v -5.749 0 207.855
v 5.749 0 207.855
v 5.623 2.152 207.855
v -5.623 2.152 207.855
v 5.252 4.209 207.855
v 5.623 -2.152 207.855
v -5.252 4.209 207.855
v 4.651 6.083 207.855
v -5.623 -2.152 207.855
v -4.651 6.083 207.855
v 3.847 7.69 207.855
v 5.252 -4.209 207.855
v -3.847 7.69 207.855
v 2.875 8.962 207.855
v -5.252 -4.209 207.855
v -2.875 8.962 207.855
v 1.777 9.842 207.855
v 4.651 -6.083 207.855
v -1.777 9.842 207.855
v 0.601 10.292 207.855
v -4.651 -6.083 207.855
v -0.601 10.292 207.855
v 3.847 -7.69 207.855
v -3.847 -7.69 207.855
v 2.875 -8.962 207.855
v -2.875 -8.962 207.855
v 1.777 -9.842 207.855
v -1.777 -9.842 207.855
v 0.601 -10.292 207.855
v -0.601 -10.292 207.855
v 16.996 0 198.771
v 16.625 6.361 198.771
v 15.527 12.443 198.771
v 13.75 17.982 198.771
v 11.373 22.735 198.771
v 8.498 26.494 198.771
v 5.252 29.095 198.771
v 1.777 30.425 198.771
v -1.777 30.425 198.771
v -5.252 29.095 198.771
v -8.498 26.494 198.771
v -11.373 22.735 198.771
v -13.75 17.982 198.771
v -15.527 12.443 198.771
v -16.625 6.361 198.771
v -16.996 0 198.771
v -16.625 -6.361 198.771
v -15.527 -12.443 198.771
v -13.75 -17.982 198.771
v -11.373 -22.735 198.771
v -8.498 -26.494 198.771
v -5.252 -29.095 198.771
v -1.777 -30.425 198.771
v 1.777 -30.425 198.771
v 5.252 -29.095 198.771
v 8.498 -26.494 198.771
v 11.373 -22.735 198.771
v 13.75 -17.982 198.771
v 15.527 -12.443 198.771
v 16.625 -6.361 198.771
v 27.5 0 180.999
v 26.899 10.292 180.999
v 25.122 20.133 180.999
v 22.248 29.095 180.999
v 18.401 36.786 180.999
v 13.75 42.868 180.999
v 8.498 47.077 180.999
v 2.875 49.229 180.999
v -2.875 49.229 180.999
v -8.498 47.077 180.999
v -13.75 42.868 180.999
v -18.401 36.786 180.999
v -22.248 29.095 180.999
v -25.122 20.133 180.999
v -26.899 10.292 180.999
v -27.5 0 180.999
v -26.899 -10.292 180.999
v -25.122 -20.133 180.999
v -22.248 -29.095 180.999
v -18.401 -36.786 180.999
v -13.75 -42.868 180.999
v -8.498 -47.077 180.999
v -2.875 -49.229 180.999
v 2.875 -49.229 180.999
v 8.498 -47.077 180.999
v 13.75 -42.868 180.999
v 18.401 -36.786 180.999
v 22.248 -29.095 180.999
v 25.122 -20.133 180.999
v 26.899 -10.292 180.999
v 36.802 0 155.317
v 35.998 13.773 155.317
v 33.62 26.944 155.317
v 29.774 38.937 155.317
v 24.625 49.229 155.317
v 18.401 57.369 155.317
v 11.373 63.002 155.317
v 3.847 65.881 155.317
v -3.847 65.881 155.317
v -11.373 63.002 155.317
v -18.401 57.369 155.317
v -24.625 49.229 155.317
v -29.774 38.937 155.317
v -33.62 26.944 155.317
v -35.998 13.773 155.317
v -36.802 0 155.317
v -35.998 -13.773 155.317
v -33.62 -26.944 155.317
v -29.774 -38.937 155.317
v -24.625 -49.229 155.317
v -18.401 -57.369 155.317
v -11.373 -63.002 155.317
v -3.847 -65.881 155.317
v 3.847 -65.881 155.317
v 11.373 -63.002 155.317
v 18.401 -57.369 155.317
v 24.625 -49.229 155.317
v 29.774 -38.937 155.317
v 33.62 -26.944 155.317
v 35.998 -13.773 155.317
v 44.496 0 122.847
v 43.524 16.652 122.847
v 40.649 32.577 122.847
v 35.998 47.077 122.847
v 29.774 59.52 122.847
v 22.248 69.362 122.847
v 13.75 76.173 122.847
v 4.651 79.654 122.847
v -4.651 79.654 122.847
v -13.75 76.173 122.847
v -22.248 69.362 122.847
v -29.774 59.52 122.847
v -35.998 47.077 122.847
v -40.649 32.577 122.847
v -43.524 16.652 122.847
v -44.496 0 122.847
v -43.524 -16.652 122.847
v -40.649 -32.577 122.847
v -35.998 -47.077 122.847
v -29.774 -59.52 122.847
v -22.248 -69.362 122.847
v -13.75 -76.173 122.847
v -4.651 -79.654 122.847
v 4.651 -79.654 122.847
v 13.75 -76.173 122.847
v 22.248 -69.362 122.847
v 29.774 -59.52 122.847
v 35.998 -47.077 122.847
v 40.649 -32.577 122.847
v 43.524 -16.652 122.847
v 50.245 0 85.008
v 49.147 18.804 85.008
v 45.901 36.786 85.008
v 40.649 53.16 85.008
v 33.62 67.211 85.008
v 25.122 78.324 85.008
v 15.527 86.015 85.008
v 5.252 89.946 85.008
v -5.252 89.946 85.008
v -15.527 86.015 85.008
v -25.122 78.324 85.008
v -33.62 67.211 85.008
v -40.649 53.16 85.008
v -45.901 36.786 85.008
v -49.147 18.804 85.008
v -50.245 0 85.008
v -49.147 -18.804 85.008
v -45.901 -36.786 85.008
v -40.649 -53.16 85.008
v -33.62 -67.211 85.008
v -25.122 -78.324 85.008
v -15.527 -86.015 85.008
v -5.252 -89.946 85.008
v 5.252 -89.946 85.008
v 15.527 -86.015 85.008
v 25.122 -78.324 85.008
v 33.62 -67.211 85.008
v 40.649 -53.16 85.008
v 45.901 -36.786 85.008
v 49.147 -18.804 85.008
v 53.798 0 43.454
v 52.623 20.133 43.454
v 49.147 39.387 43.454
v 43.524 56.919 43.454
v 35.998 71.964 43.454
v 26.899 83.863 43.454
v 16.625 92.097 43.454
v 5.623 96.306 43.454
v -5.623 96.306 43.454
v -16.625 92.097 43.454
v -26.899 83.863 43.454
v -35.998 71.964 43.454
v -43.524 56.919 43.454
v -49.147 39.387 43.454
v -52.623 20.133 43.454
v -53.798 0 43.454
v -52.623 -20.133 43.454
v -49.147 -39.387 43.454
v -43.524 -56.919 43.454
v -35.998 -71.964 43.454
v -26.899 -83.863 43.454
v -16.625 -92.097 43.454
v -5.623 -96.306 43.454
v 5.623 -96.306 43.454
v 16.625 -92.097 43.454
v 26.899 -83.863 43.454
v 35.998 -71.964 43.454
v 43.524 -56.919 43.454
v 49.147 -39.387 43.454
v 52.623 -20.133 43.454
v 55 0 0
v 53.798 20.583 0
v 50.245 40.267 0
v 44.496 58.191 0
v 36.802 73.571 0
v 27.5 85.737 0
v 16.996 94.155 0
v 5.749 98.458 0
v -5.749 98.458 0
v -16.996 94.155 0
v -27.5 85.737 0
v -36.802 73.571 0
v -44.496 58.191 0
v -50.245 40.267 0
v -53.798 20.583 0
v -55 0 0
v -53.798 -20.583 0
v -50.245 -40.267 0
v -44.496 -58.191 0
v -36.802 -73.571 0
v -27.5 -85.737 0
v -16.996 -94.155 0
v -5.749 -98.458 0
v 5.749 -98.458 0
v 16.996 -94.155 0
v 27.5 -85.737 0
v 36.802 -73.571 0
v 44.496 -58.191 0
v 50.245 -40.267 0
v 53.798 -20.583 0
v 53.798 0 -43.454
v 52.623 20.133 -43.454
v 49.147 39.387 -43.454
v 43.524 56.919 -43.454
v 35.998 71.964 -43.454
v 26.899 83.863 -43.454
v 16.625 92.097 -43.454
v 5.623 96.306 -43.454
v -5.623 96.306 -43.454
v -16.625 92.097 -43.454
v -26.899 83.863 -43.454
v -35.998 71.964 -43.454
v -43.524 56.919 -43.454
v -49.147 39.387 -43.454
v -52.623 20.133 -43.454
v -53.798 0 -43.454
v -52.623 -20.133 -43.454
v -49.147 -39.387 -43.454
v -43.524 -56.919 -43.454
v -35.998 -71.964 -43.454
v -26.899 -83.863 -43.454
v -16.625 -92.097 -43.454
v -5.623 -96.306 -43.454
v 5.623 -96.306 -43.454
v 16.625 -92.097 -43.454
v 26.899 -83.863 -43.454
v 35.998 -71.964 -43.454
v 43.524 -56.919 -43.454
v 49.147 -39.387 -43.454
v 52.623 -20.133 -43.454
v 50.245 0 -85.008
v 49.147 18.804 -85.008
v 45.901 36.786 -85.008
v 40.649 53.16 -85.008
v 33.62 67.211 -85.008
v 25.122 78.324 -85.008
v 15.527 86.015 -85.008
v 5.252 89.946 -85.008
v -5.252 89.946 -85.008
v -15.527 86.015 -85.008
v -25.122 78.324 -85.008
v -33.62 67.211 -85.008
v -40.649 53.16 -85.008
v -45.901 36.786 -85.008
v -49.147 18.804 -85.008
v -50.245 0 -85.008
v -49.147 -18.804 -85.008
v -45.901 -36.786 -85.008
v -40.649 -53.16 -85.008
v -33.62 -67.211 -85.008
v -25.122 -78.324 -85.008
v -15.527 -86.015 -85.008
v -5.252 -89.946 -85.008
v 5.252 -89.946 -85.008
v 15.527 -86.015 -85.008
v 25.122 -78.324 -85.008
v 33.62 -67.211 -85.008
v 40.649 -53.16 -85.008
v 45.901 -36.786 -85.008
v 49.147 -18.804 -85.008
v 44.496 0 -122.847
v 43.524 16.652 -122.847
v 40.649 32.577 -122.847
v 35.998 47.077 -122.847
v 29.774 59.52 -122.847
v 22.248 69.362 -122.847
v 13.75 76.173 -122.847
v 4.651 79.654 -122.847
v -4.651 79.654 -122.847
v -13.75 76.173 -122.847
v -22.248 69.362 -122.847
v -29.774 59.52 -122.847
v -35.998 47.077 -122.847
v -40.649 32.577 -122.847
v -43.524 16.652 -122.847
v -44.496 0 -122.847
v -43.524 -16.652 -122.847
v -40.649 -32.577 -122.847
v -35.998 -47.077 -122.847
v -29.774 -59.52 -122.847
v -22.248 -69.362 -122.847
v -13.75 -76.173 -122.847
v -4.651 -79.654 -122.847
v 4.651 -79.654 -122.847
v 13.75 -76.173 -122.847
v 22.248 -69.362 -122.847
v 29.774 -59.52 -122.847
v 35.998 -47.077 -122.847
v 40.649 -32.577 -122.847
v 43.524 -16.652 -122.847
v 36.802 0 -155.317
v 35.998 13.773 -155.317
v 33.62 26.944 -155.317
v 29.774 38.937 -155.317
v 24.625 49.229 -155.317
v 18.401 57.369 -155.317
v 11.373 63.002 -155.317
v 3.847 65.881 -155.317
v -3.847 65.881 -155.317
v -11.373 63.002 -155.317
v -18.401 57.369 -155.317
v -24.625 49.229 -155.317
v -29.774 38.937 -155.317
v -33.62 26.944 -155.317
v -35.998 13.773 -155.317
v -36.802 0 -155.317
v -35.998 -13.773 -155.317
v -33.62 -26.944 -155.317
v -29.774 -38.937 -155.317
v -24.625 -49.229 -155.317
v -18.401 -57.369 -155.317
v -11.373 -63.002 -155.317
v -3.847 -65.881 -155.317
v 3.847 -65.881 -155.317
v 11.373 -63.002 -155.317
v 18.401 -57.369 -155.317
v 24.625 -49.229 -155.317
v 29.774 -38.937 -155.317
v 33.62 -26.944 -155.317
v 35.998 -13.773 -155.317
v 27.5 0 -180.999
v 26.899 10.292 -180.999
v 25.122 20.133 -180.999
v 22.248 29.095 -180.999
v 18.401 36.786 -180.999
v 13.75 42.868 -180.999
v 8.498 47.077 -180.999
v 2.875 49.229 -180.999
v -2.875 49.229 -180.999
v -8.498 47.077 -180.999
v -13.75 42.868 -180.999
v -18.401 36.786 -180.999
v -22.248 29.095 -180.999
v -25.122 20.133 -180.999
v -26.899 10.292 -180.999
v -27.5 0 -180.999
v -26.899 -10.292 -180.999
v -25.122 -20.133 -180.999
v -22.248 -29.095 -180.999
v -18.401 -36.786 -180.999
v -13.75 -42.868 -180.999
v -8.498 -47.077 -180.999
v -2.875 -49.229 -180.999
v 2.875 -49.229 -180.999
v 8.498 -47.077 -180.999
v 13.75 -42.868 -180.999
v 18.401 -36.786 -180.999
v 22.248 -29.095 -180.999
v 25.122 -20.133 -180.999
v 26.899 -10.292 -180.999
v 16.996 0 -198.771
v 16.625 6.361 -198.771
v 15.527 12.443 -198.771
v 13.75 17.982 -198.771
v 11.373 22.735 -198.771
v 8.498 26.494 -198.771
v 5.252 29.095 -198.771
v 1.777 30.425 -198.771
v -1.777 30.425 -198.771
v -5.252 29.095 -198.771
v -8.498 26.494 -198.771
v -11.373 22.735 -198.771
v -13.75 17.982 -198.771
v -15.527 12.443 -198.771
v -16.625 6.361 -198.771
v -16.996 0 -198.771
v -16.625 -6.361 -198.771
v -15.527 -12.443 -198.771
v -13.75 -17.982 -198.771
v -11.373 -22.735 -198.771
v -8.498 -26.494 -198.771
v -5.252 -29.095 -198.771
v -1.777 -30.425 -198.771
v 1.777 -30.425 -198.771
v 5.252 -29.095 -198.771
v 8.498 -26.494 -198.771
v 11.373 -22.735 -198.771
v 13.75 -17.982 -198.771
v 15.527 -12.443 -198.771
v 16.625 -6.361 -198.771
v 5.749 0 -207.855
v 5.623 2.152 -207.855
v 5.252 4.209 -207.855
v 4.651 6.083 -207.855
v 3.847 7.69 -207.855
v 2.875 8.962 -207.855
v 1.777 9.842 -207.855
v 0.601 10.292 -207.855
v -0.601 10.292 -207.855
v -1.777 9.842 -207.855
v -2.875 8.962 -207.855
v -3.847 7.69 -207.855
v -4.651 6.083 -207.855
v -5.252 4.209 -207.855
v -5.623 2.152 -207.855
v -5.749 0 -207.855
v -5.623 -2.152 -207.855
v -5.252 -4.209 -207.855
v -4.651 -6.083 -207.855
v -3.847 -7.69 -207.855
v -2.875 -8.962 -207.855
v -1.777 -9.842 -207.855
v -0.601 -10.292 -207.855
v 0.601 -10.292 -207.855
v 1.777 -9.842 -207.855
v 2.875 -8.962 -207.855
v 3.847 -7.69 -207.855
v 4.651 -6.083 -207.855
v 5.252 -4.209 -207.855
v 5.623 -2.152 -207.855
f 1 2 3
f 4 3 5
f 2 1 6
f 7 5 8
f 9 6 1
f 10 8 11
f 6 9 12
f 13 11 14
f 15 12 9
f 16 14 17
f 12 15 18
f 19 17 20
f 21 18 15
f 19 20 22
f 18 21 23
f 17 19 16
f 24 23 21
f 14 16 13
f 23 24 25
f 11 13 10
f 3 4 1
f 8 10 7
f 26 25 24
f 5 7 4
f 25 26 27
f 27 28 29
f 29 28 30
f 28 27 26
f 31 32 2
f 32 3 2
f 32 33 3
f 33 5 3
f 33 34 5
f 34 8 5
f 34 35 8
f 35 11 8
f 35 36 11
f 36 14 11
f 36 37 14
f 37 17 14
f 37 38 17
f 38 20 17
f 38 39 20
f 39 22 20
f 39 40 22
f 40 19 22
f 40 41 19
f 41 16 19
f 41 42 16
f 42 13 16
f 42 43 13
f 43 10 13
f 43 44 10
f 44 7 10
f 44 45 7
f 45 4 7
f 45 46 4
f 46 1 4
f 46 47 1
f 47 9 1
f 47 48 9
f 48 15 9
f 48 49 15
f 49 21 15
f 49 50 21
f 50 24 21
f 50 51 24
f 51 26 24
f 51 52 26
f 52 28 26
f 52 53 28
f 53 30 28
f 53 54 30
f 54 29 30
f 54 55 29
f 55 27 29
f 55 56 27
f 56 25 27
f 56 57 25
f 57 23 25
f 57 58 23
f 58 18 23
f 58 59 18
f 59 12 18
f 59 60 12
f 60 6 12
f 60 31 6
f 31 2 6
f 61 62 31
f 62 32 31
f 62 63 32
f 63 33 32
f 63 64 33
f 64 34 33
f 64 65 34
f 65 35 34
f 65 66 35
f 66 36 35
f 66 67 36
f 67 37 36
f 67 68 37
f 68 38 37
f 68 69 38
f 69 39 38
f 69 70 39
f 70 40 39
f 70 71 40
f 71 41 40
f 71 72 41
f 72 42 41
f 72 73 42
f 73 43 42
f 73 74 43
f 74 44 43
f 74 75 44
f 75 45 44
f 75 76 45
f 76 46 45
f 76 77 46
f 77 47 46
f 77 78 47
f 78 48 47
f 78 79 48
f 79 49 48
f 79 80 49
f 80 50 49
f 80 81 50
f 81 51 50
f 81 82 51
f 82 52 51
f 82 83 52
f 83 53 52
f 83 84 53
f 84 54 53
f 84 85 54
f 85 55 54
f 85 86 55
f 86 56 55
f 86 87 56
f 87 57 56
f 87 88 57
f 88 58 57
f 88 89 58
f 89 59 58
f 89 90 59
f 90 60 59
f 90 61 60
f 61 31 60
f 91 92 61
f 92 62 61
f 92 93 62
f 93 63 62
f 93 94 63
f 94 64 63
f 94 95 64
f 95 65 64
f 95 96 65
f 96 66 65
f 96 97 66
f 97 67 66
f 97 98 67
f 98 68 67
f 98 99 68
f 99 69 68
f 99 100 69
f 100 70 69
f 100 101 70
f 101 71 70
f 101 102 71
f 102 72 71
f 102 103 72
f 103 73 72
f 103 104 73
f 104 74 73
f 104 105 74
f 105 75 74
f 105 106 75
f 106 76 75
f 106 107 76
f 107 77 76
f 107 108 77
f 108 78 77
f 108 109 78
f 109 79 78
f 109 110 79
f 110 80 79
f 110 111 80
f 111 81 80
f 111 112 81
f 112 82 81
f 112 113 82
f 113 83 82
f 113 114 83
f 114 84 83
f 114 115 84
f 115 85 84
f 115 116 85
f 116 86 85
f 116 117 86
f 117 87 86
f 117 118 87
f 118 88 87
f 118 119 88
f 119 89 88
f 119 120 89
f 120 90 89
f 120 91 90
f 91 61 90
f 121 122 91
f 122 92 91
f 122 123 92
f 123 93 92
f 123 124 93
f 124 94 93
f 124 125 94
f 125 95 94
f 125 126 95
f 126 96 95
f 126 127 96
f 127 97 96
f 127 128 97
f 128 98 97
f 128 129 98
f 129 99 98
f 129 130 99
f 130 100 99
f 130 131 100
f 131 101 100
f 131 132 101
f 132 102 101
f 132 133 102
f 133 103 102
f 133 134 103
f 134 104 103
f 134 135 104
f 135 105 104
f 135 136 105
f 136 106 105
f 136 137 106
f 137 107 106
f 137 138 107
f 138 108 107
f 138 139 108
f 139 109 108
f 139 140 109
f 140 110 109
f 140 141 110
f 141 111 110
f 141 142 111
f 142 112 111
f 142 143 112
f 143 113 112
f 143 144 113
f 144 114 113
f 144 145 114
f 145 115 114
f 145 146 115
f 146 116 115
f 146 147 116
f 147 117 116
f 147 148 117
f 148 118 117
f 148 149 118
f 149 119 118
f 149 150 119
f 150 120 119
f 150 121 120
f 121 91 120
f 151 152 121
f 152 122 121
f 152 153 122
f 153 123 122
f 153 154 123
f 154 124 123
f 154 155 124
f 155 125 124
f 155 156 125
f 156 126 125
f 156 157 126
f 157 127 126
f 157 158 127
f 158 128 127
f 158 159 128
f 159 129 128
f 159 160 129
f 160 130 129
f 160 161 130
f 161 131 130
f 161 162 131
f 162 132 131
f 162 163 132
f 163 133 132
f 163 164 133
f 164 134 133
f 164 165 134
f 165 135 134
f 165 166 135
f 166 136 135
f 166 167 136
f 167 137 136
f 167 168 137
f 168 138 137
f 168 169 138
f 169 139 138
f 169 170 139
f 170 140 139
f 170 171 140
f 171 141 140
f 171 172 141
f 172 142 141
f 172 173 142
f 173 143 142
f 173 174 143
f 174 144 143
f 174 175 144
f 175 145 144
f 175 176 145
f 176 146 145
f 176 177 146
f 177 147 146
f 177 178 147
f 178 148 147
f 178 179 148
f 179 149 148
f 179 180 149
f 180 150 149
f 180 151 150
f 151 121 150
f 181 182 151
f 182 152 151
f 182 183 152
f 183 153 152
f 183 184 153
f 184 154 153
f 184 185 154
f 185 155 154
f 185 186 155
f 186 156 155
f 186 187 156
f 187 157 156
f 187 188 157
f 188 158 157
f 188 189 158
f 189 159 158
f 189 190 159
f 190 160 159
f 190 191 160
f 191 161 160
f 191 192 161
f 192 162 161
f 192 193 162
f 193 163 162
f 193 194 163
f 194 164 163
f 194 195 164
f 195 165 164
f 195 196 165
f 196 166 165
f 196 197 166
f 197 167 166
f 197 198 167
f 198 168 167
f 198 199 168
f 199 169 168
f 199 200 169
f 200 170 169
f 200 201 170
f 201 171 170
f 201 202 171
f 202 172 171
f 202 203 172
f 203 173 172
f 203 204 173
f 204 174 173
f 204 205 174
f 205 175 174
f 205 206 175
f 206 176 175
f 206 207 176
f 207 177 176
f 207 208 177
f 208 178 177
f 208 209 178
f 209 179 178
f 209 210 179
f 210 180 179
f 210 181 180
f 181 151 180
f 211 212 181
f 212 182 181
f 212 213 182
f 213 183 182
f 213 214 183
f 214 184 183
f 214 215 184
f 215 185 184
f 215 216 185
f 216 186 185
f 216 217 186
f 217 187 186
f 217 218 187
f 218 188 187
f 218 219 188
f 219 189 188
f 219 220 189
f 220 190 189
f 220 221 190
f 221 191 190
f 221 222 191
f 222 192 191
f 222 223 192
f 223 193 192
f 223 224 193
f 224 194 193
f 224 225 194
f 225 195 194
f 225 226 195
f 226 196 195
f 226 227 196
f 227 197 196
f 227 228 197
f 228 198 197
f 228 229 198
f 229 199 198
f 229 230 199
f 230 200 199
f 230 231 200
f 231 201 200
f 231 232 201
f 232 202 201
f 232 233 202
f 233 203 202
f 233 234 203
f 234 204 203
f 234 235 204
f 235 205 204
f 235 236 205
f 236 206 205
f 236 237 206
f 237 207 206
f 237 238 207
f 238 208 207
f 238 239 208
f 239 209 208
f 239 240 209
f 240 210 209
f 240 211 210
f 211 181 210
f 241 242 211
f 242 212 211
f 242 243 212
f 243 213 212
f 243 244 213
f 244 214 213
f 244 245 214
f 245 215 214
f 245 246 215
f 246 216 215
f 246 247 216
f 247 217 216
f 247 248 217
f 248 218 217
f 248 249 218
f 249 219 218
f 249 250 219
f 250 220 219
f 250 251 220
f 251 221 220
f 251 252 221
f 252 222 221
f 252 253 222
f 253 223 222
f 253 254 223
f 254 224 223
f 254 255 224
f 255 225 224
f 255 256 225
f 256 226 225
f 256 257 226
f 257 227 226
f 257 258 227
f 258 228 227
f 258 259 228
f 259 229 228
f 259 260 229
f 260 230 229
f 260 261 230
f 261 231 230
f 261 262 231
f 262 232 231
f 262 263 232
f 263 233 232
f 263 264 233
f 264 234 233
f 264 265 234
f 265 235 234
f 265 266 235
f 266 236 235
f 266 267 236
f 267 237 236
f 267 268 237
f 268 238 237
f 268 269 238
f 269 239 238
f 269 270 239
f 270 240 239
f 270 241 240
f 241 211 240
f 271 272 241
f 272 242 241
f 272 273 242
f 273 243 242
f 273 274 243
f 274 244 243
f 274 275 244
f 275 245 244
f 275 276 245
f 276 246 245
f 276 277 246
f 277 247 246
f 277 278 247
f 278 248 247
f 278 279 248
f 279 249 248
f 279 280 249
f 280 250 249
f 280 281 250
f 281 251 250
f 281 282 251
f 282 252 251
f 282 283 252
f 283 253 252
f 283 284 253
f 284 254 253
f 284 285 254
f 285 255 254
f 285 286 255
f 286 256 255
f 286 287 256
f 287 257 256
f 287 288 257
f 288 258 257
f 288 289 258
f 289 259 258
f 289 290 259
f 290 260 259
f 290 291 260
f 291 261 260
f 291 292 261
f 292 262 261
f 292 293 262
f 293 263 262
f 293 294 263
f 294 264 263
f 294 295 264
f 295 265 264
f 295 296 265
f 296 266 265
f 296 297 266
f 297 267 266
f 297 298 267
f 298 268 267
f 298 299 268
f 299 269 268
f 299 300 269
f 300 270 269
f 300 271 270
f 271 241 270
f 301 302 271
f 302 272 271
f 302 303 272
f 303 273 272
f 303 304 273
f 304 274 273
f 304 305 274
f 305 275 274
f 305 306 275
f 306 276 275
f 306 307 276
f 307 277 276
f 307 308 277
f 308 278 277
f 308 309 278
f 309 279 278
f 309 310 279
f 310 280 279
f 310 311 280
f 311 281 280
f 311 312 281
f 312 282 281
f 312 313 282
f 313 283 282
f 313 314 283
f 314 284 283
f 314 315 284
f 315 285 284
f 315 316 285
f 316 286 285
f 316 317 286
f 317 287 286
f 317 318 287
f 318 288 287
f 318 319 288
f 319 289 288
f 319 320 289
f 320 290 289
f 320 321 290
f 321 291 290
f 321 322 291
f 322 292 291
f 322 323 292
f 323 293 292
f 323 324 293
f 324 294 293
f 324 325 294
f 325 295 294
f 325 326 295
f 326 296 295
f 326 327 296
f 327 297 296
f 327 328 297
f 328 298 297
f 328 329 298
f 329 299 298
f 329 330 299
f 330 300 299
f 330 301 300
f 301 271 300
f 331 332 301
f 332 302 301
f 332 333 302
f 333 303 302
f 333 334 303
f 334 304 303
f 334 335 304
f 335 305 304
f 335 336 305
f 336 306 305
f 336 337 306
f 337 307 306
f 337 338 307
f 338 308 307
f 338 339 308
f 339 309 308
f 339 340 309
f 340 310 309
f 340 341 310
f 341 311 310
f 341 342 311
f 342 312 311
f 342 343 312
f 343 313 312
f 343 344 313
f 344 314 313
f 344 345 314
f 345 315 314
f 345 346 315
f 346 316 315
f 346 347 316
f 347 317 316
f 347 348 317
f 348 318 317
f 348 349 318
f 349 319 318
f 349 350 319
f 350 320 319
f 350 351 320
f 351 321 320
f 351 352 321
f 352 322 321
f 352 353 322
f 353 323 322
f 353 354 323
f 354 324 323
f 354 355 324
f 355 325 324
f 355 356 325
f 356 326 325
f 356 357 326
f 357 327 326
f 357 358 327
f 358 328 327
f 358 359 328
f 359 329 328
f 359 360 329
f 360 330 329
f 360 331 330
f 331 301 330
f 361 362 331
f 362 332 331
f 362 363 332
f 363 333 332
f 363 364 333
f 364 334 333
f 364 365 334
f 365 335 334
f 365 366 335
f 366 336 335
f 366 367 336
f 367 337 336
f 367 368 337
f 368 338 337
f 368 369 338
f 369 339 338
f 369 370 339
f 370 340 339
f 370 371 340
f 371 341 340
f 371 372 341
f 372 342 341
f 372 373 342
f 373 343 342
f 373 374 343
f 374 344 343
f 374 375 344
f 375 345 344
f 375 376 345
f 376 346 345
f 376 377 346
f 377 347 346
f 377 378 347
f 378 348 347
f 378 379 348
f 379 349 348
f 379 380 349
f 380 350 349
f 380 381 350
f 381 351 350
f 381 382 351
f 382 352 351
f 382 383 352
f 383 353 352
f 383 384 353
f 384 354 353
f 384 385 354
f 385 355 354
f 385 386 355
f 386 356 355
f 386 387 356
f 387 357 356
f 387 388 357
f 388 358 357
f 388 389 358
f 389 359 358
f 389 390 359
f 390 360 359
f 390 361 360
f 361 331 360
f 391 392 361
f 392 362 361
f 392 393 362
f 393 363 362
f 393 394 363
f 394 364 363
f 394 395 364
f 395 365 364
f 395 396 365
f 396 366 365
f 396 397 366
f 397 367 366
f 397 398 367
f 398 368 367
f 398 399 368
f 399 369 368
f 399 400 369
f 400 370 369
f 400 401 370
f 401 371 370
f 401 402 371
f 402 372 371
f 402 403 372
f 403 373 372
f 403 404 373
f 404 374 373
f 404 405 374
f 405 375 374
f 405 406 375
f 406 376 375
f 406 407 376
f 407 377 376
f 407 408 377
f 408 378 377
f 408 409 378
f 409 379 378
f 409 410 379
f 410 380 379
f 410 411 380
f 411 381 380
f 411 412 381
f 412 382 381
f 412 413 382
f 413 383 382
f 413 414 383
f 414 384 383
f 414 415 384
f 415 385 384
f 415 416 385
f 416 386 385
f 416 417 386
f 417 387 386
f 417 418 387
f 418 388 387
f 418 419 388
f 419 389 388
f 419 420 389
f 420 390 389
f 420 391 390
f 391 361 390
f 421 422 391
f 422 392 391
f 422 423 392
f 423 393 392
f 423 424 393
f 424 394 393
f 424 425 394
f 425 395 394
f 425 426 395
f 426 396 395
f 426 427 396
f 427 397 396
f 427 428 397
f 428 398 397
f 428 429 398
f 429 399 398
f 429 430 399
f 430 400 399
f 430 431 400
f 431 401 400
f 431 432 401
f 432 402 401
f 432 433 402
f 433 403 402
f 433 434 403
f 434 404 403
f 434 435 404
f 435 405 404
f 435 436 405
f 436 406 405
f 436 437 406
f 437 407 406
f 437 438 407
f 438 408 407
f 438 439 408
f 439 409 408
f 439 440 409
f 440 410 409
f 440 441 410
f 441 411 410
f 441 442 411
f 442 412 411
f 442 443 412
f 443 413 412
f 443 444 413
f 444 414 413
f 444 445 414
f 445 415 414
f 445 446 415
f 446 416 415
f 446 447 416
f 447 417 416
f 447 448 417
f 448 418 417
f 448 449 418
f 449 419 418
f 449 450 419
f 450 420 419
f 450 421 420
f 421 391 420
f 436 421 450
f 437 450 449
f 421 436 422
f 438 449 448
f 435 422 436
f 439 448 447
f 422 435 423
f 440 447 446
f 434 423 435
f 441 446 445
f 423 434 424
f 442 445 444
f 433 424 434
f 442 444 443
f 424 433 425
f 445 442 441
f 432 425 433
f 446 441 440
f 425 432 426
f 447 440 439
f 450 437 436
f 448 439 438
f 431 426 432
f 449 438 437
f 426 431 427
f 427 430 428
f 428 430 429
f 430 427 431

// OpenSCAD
// Generated by SolidPython 1.0.1 on 2020-07-29 00:46:46


scale(v = [5, 9, 19]) {
	sphere(r = 11);
}
/***********************************************
*********      SolidPython code:      **********
************************************************
 
# import packages: SolidPython
from solid import *
from solid.utils import *
from itertools import chain, combinations, permutations


class Resize:

    def __init__(self, scad_file):
        self.scad_file = scad_file
        #self.scad_file = import_scad(scad_file)
        # cone/cylinder param:
        self.r1 = 0
        self.r2 = 0
        self.h = 0
        # rectangular prism param:
        self.w = 0
        self.l = 0
        # ellipse param:
        self.r = 0

    # import OpenScad code (file name corresponds to shape)


    # classify shape + parameters
    def assign(self, param1, param2, param3):
        if self.scad_file == 'cone.scad':
            self.r1 = param1
            self.r2 = param2
            self.h = param3
        elif self.scad_file == 'cylinder.scad':
            self.r1 = param1
            self.r2 = param2
            self.h = param3
        elif self.scad_file == 'rectangularPrism.scad':
            self.h = param1
            self.l = param2
            self.w = param3
        else:
            self.r = param1
            self.h = param2

    # resize parameters
    def iterate(self):
        x = range(3, 20, 2)
        i = 1
        if self.scad_file == 'cone.scad':
            tempList = list(permutations(x, 2))
            for temp in tempList:
                param1 = temp[0]
                param2 = temp[1]
                filepath = 'produced_scad_files/' + 'cone' + str(param1) + '_' + str(param2) + '_' + '.scad'
                scad_render_to_file(cylinder(h=param1, r1=param2, r2=0), filepath)

        elif self.scad_file == 'cylinder.scad':
            tempList = list(permutations(x, 3))
            for temp in tempList:
                param1 = temp[0]
                param2 = temp[1]
                filepath = 'produced_scad_files/' + 'cylinder' + str(param1) + '_' + str(param2) + '_' + '.scad'
                scad_render_to_file(cylinder(h=param1, r1=param2, r2=param2), filepath)

        elif self.scad_file == 'rectangularPrism.scad':
            tempList = list(permutations(x, 3))
            for temp in tempList:
                param1 = temp[0]
                param2 = temp[1]
                param3 = temp[2]
                filepath = 'produced_scad_files/' + 'rectangularPrism' + str(param1) + '_' + str(param2) + '_' + str(
                    param3) + '.scad'
                scad_render_to_file(cube(size=(param1, param2, param3)), filepath)

        elif self.scad_file == 'ellipse.scad':
            tempList = list(permutations(x, 4))
            for temp in tempList:
                param1 = temp[0]
                param2 = temp[1]
                param3 = temp[2]
                param4 = temp[3]
                filepath = 'produced_scad_files/' + 'ellipse' + str(param1) + '_' + str(param2) + '_' + str(param3) + '_' + str(param4) + '.scad'
                scad_render_to_file(scale([param1, param2, param3])(sphere(r=param4)), filepath)

    def render_to_scadfile(self):
        scad_render_to_file(scad, 'example.scad') 
 
************************************************/
